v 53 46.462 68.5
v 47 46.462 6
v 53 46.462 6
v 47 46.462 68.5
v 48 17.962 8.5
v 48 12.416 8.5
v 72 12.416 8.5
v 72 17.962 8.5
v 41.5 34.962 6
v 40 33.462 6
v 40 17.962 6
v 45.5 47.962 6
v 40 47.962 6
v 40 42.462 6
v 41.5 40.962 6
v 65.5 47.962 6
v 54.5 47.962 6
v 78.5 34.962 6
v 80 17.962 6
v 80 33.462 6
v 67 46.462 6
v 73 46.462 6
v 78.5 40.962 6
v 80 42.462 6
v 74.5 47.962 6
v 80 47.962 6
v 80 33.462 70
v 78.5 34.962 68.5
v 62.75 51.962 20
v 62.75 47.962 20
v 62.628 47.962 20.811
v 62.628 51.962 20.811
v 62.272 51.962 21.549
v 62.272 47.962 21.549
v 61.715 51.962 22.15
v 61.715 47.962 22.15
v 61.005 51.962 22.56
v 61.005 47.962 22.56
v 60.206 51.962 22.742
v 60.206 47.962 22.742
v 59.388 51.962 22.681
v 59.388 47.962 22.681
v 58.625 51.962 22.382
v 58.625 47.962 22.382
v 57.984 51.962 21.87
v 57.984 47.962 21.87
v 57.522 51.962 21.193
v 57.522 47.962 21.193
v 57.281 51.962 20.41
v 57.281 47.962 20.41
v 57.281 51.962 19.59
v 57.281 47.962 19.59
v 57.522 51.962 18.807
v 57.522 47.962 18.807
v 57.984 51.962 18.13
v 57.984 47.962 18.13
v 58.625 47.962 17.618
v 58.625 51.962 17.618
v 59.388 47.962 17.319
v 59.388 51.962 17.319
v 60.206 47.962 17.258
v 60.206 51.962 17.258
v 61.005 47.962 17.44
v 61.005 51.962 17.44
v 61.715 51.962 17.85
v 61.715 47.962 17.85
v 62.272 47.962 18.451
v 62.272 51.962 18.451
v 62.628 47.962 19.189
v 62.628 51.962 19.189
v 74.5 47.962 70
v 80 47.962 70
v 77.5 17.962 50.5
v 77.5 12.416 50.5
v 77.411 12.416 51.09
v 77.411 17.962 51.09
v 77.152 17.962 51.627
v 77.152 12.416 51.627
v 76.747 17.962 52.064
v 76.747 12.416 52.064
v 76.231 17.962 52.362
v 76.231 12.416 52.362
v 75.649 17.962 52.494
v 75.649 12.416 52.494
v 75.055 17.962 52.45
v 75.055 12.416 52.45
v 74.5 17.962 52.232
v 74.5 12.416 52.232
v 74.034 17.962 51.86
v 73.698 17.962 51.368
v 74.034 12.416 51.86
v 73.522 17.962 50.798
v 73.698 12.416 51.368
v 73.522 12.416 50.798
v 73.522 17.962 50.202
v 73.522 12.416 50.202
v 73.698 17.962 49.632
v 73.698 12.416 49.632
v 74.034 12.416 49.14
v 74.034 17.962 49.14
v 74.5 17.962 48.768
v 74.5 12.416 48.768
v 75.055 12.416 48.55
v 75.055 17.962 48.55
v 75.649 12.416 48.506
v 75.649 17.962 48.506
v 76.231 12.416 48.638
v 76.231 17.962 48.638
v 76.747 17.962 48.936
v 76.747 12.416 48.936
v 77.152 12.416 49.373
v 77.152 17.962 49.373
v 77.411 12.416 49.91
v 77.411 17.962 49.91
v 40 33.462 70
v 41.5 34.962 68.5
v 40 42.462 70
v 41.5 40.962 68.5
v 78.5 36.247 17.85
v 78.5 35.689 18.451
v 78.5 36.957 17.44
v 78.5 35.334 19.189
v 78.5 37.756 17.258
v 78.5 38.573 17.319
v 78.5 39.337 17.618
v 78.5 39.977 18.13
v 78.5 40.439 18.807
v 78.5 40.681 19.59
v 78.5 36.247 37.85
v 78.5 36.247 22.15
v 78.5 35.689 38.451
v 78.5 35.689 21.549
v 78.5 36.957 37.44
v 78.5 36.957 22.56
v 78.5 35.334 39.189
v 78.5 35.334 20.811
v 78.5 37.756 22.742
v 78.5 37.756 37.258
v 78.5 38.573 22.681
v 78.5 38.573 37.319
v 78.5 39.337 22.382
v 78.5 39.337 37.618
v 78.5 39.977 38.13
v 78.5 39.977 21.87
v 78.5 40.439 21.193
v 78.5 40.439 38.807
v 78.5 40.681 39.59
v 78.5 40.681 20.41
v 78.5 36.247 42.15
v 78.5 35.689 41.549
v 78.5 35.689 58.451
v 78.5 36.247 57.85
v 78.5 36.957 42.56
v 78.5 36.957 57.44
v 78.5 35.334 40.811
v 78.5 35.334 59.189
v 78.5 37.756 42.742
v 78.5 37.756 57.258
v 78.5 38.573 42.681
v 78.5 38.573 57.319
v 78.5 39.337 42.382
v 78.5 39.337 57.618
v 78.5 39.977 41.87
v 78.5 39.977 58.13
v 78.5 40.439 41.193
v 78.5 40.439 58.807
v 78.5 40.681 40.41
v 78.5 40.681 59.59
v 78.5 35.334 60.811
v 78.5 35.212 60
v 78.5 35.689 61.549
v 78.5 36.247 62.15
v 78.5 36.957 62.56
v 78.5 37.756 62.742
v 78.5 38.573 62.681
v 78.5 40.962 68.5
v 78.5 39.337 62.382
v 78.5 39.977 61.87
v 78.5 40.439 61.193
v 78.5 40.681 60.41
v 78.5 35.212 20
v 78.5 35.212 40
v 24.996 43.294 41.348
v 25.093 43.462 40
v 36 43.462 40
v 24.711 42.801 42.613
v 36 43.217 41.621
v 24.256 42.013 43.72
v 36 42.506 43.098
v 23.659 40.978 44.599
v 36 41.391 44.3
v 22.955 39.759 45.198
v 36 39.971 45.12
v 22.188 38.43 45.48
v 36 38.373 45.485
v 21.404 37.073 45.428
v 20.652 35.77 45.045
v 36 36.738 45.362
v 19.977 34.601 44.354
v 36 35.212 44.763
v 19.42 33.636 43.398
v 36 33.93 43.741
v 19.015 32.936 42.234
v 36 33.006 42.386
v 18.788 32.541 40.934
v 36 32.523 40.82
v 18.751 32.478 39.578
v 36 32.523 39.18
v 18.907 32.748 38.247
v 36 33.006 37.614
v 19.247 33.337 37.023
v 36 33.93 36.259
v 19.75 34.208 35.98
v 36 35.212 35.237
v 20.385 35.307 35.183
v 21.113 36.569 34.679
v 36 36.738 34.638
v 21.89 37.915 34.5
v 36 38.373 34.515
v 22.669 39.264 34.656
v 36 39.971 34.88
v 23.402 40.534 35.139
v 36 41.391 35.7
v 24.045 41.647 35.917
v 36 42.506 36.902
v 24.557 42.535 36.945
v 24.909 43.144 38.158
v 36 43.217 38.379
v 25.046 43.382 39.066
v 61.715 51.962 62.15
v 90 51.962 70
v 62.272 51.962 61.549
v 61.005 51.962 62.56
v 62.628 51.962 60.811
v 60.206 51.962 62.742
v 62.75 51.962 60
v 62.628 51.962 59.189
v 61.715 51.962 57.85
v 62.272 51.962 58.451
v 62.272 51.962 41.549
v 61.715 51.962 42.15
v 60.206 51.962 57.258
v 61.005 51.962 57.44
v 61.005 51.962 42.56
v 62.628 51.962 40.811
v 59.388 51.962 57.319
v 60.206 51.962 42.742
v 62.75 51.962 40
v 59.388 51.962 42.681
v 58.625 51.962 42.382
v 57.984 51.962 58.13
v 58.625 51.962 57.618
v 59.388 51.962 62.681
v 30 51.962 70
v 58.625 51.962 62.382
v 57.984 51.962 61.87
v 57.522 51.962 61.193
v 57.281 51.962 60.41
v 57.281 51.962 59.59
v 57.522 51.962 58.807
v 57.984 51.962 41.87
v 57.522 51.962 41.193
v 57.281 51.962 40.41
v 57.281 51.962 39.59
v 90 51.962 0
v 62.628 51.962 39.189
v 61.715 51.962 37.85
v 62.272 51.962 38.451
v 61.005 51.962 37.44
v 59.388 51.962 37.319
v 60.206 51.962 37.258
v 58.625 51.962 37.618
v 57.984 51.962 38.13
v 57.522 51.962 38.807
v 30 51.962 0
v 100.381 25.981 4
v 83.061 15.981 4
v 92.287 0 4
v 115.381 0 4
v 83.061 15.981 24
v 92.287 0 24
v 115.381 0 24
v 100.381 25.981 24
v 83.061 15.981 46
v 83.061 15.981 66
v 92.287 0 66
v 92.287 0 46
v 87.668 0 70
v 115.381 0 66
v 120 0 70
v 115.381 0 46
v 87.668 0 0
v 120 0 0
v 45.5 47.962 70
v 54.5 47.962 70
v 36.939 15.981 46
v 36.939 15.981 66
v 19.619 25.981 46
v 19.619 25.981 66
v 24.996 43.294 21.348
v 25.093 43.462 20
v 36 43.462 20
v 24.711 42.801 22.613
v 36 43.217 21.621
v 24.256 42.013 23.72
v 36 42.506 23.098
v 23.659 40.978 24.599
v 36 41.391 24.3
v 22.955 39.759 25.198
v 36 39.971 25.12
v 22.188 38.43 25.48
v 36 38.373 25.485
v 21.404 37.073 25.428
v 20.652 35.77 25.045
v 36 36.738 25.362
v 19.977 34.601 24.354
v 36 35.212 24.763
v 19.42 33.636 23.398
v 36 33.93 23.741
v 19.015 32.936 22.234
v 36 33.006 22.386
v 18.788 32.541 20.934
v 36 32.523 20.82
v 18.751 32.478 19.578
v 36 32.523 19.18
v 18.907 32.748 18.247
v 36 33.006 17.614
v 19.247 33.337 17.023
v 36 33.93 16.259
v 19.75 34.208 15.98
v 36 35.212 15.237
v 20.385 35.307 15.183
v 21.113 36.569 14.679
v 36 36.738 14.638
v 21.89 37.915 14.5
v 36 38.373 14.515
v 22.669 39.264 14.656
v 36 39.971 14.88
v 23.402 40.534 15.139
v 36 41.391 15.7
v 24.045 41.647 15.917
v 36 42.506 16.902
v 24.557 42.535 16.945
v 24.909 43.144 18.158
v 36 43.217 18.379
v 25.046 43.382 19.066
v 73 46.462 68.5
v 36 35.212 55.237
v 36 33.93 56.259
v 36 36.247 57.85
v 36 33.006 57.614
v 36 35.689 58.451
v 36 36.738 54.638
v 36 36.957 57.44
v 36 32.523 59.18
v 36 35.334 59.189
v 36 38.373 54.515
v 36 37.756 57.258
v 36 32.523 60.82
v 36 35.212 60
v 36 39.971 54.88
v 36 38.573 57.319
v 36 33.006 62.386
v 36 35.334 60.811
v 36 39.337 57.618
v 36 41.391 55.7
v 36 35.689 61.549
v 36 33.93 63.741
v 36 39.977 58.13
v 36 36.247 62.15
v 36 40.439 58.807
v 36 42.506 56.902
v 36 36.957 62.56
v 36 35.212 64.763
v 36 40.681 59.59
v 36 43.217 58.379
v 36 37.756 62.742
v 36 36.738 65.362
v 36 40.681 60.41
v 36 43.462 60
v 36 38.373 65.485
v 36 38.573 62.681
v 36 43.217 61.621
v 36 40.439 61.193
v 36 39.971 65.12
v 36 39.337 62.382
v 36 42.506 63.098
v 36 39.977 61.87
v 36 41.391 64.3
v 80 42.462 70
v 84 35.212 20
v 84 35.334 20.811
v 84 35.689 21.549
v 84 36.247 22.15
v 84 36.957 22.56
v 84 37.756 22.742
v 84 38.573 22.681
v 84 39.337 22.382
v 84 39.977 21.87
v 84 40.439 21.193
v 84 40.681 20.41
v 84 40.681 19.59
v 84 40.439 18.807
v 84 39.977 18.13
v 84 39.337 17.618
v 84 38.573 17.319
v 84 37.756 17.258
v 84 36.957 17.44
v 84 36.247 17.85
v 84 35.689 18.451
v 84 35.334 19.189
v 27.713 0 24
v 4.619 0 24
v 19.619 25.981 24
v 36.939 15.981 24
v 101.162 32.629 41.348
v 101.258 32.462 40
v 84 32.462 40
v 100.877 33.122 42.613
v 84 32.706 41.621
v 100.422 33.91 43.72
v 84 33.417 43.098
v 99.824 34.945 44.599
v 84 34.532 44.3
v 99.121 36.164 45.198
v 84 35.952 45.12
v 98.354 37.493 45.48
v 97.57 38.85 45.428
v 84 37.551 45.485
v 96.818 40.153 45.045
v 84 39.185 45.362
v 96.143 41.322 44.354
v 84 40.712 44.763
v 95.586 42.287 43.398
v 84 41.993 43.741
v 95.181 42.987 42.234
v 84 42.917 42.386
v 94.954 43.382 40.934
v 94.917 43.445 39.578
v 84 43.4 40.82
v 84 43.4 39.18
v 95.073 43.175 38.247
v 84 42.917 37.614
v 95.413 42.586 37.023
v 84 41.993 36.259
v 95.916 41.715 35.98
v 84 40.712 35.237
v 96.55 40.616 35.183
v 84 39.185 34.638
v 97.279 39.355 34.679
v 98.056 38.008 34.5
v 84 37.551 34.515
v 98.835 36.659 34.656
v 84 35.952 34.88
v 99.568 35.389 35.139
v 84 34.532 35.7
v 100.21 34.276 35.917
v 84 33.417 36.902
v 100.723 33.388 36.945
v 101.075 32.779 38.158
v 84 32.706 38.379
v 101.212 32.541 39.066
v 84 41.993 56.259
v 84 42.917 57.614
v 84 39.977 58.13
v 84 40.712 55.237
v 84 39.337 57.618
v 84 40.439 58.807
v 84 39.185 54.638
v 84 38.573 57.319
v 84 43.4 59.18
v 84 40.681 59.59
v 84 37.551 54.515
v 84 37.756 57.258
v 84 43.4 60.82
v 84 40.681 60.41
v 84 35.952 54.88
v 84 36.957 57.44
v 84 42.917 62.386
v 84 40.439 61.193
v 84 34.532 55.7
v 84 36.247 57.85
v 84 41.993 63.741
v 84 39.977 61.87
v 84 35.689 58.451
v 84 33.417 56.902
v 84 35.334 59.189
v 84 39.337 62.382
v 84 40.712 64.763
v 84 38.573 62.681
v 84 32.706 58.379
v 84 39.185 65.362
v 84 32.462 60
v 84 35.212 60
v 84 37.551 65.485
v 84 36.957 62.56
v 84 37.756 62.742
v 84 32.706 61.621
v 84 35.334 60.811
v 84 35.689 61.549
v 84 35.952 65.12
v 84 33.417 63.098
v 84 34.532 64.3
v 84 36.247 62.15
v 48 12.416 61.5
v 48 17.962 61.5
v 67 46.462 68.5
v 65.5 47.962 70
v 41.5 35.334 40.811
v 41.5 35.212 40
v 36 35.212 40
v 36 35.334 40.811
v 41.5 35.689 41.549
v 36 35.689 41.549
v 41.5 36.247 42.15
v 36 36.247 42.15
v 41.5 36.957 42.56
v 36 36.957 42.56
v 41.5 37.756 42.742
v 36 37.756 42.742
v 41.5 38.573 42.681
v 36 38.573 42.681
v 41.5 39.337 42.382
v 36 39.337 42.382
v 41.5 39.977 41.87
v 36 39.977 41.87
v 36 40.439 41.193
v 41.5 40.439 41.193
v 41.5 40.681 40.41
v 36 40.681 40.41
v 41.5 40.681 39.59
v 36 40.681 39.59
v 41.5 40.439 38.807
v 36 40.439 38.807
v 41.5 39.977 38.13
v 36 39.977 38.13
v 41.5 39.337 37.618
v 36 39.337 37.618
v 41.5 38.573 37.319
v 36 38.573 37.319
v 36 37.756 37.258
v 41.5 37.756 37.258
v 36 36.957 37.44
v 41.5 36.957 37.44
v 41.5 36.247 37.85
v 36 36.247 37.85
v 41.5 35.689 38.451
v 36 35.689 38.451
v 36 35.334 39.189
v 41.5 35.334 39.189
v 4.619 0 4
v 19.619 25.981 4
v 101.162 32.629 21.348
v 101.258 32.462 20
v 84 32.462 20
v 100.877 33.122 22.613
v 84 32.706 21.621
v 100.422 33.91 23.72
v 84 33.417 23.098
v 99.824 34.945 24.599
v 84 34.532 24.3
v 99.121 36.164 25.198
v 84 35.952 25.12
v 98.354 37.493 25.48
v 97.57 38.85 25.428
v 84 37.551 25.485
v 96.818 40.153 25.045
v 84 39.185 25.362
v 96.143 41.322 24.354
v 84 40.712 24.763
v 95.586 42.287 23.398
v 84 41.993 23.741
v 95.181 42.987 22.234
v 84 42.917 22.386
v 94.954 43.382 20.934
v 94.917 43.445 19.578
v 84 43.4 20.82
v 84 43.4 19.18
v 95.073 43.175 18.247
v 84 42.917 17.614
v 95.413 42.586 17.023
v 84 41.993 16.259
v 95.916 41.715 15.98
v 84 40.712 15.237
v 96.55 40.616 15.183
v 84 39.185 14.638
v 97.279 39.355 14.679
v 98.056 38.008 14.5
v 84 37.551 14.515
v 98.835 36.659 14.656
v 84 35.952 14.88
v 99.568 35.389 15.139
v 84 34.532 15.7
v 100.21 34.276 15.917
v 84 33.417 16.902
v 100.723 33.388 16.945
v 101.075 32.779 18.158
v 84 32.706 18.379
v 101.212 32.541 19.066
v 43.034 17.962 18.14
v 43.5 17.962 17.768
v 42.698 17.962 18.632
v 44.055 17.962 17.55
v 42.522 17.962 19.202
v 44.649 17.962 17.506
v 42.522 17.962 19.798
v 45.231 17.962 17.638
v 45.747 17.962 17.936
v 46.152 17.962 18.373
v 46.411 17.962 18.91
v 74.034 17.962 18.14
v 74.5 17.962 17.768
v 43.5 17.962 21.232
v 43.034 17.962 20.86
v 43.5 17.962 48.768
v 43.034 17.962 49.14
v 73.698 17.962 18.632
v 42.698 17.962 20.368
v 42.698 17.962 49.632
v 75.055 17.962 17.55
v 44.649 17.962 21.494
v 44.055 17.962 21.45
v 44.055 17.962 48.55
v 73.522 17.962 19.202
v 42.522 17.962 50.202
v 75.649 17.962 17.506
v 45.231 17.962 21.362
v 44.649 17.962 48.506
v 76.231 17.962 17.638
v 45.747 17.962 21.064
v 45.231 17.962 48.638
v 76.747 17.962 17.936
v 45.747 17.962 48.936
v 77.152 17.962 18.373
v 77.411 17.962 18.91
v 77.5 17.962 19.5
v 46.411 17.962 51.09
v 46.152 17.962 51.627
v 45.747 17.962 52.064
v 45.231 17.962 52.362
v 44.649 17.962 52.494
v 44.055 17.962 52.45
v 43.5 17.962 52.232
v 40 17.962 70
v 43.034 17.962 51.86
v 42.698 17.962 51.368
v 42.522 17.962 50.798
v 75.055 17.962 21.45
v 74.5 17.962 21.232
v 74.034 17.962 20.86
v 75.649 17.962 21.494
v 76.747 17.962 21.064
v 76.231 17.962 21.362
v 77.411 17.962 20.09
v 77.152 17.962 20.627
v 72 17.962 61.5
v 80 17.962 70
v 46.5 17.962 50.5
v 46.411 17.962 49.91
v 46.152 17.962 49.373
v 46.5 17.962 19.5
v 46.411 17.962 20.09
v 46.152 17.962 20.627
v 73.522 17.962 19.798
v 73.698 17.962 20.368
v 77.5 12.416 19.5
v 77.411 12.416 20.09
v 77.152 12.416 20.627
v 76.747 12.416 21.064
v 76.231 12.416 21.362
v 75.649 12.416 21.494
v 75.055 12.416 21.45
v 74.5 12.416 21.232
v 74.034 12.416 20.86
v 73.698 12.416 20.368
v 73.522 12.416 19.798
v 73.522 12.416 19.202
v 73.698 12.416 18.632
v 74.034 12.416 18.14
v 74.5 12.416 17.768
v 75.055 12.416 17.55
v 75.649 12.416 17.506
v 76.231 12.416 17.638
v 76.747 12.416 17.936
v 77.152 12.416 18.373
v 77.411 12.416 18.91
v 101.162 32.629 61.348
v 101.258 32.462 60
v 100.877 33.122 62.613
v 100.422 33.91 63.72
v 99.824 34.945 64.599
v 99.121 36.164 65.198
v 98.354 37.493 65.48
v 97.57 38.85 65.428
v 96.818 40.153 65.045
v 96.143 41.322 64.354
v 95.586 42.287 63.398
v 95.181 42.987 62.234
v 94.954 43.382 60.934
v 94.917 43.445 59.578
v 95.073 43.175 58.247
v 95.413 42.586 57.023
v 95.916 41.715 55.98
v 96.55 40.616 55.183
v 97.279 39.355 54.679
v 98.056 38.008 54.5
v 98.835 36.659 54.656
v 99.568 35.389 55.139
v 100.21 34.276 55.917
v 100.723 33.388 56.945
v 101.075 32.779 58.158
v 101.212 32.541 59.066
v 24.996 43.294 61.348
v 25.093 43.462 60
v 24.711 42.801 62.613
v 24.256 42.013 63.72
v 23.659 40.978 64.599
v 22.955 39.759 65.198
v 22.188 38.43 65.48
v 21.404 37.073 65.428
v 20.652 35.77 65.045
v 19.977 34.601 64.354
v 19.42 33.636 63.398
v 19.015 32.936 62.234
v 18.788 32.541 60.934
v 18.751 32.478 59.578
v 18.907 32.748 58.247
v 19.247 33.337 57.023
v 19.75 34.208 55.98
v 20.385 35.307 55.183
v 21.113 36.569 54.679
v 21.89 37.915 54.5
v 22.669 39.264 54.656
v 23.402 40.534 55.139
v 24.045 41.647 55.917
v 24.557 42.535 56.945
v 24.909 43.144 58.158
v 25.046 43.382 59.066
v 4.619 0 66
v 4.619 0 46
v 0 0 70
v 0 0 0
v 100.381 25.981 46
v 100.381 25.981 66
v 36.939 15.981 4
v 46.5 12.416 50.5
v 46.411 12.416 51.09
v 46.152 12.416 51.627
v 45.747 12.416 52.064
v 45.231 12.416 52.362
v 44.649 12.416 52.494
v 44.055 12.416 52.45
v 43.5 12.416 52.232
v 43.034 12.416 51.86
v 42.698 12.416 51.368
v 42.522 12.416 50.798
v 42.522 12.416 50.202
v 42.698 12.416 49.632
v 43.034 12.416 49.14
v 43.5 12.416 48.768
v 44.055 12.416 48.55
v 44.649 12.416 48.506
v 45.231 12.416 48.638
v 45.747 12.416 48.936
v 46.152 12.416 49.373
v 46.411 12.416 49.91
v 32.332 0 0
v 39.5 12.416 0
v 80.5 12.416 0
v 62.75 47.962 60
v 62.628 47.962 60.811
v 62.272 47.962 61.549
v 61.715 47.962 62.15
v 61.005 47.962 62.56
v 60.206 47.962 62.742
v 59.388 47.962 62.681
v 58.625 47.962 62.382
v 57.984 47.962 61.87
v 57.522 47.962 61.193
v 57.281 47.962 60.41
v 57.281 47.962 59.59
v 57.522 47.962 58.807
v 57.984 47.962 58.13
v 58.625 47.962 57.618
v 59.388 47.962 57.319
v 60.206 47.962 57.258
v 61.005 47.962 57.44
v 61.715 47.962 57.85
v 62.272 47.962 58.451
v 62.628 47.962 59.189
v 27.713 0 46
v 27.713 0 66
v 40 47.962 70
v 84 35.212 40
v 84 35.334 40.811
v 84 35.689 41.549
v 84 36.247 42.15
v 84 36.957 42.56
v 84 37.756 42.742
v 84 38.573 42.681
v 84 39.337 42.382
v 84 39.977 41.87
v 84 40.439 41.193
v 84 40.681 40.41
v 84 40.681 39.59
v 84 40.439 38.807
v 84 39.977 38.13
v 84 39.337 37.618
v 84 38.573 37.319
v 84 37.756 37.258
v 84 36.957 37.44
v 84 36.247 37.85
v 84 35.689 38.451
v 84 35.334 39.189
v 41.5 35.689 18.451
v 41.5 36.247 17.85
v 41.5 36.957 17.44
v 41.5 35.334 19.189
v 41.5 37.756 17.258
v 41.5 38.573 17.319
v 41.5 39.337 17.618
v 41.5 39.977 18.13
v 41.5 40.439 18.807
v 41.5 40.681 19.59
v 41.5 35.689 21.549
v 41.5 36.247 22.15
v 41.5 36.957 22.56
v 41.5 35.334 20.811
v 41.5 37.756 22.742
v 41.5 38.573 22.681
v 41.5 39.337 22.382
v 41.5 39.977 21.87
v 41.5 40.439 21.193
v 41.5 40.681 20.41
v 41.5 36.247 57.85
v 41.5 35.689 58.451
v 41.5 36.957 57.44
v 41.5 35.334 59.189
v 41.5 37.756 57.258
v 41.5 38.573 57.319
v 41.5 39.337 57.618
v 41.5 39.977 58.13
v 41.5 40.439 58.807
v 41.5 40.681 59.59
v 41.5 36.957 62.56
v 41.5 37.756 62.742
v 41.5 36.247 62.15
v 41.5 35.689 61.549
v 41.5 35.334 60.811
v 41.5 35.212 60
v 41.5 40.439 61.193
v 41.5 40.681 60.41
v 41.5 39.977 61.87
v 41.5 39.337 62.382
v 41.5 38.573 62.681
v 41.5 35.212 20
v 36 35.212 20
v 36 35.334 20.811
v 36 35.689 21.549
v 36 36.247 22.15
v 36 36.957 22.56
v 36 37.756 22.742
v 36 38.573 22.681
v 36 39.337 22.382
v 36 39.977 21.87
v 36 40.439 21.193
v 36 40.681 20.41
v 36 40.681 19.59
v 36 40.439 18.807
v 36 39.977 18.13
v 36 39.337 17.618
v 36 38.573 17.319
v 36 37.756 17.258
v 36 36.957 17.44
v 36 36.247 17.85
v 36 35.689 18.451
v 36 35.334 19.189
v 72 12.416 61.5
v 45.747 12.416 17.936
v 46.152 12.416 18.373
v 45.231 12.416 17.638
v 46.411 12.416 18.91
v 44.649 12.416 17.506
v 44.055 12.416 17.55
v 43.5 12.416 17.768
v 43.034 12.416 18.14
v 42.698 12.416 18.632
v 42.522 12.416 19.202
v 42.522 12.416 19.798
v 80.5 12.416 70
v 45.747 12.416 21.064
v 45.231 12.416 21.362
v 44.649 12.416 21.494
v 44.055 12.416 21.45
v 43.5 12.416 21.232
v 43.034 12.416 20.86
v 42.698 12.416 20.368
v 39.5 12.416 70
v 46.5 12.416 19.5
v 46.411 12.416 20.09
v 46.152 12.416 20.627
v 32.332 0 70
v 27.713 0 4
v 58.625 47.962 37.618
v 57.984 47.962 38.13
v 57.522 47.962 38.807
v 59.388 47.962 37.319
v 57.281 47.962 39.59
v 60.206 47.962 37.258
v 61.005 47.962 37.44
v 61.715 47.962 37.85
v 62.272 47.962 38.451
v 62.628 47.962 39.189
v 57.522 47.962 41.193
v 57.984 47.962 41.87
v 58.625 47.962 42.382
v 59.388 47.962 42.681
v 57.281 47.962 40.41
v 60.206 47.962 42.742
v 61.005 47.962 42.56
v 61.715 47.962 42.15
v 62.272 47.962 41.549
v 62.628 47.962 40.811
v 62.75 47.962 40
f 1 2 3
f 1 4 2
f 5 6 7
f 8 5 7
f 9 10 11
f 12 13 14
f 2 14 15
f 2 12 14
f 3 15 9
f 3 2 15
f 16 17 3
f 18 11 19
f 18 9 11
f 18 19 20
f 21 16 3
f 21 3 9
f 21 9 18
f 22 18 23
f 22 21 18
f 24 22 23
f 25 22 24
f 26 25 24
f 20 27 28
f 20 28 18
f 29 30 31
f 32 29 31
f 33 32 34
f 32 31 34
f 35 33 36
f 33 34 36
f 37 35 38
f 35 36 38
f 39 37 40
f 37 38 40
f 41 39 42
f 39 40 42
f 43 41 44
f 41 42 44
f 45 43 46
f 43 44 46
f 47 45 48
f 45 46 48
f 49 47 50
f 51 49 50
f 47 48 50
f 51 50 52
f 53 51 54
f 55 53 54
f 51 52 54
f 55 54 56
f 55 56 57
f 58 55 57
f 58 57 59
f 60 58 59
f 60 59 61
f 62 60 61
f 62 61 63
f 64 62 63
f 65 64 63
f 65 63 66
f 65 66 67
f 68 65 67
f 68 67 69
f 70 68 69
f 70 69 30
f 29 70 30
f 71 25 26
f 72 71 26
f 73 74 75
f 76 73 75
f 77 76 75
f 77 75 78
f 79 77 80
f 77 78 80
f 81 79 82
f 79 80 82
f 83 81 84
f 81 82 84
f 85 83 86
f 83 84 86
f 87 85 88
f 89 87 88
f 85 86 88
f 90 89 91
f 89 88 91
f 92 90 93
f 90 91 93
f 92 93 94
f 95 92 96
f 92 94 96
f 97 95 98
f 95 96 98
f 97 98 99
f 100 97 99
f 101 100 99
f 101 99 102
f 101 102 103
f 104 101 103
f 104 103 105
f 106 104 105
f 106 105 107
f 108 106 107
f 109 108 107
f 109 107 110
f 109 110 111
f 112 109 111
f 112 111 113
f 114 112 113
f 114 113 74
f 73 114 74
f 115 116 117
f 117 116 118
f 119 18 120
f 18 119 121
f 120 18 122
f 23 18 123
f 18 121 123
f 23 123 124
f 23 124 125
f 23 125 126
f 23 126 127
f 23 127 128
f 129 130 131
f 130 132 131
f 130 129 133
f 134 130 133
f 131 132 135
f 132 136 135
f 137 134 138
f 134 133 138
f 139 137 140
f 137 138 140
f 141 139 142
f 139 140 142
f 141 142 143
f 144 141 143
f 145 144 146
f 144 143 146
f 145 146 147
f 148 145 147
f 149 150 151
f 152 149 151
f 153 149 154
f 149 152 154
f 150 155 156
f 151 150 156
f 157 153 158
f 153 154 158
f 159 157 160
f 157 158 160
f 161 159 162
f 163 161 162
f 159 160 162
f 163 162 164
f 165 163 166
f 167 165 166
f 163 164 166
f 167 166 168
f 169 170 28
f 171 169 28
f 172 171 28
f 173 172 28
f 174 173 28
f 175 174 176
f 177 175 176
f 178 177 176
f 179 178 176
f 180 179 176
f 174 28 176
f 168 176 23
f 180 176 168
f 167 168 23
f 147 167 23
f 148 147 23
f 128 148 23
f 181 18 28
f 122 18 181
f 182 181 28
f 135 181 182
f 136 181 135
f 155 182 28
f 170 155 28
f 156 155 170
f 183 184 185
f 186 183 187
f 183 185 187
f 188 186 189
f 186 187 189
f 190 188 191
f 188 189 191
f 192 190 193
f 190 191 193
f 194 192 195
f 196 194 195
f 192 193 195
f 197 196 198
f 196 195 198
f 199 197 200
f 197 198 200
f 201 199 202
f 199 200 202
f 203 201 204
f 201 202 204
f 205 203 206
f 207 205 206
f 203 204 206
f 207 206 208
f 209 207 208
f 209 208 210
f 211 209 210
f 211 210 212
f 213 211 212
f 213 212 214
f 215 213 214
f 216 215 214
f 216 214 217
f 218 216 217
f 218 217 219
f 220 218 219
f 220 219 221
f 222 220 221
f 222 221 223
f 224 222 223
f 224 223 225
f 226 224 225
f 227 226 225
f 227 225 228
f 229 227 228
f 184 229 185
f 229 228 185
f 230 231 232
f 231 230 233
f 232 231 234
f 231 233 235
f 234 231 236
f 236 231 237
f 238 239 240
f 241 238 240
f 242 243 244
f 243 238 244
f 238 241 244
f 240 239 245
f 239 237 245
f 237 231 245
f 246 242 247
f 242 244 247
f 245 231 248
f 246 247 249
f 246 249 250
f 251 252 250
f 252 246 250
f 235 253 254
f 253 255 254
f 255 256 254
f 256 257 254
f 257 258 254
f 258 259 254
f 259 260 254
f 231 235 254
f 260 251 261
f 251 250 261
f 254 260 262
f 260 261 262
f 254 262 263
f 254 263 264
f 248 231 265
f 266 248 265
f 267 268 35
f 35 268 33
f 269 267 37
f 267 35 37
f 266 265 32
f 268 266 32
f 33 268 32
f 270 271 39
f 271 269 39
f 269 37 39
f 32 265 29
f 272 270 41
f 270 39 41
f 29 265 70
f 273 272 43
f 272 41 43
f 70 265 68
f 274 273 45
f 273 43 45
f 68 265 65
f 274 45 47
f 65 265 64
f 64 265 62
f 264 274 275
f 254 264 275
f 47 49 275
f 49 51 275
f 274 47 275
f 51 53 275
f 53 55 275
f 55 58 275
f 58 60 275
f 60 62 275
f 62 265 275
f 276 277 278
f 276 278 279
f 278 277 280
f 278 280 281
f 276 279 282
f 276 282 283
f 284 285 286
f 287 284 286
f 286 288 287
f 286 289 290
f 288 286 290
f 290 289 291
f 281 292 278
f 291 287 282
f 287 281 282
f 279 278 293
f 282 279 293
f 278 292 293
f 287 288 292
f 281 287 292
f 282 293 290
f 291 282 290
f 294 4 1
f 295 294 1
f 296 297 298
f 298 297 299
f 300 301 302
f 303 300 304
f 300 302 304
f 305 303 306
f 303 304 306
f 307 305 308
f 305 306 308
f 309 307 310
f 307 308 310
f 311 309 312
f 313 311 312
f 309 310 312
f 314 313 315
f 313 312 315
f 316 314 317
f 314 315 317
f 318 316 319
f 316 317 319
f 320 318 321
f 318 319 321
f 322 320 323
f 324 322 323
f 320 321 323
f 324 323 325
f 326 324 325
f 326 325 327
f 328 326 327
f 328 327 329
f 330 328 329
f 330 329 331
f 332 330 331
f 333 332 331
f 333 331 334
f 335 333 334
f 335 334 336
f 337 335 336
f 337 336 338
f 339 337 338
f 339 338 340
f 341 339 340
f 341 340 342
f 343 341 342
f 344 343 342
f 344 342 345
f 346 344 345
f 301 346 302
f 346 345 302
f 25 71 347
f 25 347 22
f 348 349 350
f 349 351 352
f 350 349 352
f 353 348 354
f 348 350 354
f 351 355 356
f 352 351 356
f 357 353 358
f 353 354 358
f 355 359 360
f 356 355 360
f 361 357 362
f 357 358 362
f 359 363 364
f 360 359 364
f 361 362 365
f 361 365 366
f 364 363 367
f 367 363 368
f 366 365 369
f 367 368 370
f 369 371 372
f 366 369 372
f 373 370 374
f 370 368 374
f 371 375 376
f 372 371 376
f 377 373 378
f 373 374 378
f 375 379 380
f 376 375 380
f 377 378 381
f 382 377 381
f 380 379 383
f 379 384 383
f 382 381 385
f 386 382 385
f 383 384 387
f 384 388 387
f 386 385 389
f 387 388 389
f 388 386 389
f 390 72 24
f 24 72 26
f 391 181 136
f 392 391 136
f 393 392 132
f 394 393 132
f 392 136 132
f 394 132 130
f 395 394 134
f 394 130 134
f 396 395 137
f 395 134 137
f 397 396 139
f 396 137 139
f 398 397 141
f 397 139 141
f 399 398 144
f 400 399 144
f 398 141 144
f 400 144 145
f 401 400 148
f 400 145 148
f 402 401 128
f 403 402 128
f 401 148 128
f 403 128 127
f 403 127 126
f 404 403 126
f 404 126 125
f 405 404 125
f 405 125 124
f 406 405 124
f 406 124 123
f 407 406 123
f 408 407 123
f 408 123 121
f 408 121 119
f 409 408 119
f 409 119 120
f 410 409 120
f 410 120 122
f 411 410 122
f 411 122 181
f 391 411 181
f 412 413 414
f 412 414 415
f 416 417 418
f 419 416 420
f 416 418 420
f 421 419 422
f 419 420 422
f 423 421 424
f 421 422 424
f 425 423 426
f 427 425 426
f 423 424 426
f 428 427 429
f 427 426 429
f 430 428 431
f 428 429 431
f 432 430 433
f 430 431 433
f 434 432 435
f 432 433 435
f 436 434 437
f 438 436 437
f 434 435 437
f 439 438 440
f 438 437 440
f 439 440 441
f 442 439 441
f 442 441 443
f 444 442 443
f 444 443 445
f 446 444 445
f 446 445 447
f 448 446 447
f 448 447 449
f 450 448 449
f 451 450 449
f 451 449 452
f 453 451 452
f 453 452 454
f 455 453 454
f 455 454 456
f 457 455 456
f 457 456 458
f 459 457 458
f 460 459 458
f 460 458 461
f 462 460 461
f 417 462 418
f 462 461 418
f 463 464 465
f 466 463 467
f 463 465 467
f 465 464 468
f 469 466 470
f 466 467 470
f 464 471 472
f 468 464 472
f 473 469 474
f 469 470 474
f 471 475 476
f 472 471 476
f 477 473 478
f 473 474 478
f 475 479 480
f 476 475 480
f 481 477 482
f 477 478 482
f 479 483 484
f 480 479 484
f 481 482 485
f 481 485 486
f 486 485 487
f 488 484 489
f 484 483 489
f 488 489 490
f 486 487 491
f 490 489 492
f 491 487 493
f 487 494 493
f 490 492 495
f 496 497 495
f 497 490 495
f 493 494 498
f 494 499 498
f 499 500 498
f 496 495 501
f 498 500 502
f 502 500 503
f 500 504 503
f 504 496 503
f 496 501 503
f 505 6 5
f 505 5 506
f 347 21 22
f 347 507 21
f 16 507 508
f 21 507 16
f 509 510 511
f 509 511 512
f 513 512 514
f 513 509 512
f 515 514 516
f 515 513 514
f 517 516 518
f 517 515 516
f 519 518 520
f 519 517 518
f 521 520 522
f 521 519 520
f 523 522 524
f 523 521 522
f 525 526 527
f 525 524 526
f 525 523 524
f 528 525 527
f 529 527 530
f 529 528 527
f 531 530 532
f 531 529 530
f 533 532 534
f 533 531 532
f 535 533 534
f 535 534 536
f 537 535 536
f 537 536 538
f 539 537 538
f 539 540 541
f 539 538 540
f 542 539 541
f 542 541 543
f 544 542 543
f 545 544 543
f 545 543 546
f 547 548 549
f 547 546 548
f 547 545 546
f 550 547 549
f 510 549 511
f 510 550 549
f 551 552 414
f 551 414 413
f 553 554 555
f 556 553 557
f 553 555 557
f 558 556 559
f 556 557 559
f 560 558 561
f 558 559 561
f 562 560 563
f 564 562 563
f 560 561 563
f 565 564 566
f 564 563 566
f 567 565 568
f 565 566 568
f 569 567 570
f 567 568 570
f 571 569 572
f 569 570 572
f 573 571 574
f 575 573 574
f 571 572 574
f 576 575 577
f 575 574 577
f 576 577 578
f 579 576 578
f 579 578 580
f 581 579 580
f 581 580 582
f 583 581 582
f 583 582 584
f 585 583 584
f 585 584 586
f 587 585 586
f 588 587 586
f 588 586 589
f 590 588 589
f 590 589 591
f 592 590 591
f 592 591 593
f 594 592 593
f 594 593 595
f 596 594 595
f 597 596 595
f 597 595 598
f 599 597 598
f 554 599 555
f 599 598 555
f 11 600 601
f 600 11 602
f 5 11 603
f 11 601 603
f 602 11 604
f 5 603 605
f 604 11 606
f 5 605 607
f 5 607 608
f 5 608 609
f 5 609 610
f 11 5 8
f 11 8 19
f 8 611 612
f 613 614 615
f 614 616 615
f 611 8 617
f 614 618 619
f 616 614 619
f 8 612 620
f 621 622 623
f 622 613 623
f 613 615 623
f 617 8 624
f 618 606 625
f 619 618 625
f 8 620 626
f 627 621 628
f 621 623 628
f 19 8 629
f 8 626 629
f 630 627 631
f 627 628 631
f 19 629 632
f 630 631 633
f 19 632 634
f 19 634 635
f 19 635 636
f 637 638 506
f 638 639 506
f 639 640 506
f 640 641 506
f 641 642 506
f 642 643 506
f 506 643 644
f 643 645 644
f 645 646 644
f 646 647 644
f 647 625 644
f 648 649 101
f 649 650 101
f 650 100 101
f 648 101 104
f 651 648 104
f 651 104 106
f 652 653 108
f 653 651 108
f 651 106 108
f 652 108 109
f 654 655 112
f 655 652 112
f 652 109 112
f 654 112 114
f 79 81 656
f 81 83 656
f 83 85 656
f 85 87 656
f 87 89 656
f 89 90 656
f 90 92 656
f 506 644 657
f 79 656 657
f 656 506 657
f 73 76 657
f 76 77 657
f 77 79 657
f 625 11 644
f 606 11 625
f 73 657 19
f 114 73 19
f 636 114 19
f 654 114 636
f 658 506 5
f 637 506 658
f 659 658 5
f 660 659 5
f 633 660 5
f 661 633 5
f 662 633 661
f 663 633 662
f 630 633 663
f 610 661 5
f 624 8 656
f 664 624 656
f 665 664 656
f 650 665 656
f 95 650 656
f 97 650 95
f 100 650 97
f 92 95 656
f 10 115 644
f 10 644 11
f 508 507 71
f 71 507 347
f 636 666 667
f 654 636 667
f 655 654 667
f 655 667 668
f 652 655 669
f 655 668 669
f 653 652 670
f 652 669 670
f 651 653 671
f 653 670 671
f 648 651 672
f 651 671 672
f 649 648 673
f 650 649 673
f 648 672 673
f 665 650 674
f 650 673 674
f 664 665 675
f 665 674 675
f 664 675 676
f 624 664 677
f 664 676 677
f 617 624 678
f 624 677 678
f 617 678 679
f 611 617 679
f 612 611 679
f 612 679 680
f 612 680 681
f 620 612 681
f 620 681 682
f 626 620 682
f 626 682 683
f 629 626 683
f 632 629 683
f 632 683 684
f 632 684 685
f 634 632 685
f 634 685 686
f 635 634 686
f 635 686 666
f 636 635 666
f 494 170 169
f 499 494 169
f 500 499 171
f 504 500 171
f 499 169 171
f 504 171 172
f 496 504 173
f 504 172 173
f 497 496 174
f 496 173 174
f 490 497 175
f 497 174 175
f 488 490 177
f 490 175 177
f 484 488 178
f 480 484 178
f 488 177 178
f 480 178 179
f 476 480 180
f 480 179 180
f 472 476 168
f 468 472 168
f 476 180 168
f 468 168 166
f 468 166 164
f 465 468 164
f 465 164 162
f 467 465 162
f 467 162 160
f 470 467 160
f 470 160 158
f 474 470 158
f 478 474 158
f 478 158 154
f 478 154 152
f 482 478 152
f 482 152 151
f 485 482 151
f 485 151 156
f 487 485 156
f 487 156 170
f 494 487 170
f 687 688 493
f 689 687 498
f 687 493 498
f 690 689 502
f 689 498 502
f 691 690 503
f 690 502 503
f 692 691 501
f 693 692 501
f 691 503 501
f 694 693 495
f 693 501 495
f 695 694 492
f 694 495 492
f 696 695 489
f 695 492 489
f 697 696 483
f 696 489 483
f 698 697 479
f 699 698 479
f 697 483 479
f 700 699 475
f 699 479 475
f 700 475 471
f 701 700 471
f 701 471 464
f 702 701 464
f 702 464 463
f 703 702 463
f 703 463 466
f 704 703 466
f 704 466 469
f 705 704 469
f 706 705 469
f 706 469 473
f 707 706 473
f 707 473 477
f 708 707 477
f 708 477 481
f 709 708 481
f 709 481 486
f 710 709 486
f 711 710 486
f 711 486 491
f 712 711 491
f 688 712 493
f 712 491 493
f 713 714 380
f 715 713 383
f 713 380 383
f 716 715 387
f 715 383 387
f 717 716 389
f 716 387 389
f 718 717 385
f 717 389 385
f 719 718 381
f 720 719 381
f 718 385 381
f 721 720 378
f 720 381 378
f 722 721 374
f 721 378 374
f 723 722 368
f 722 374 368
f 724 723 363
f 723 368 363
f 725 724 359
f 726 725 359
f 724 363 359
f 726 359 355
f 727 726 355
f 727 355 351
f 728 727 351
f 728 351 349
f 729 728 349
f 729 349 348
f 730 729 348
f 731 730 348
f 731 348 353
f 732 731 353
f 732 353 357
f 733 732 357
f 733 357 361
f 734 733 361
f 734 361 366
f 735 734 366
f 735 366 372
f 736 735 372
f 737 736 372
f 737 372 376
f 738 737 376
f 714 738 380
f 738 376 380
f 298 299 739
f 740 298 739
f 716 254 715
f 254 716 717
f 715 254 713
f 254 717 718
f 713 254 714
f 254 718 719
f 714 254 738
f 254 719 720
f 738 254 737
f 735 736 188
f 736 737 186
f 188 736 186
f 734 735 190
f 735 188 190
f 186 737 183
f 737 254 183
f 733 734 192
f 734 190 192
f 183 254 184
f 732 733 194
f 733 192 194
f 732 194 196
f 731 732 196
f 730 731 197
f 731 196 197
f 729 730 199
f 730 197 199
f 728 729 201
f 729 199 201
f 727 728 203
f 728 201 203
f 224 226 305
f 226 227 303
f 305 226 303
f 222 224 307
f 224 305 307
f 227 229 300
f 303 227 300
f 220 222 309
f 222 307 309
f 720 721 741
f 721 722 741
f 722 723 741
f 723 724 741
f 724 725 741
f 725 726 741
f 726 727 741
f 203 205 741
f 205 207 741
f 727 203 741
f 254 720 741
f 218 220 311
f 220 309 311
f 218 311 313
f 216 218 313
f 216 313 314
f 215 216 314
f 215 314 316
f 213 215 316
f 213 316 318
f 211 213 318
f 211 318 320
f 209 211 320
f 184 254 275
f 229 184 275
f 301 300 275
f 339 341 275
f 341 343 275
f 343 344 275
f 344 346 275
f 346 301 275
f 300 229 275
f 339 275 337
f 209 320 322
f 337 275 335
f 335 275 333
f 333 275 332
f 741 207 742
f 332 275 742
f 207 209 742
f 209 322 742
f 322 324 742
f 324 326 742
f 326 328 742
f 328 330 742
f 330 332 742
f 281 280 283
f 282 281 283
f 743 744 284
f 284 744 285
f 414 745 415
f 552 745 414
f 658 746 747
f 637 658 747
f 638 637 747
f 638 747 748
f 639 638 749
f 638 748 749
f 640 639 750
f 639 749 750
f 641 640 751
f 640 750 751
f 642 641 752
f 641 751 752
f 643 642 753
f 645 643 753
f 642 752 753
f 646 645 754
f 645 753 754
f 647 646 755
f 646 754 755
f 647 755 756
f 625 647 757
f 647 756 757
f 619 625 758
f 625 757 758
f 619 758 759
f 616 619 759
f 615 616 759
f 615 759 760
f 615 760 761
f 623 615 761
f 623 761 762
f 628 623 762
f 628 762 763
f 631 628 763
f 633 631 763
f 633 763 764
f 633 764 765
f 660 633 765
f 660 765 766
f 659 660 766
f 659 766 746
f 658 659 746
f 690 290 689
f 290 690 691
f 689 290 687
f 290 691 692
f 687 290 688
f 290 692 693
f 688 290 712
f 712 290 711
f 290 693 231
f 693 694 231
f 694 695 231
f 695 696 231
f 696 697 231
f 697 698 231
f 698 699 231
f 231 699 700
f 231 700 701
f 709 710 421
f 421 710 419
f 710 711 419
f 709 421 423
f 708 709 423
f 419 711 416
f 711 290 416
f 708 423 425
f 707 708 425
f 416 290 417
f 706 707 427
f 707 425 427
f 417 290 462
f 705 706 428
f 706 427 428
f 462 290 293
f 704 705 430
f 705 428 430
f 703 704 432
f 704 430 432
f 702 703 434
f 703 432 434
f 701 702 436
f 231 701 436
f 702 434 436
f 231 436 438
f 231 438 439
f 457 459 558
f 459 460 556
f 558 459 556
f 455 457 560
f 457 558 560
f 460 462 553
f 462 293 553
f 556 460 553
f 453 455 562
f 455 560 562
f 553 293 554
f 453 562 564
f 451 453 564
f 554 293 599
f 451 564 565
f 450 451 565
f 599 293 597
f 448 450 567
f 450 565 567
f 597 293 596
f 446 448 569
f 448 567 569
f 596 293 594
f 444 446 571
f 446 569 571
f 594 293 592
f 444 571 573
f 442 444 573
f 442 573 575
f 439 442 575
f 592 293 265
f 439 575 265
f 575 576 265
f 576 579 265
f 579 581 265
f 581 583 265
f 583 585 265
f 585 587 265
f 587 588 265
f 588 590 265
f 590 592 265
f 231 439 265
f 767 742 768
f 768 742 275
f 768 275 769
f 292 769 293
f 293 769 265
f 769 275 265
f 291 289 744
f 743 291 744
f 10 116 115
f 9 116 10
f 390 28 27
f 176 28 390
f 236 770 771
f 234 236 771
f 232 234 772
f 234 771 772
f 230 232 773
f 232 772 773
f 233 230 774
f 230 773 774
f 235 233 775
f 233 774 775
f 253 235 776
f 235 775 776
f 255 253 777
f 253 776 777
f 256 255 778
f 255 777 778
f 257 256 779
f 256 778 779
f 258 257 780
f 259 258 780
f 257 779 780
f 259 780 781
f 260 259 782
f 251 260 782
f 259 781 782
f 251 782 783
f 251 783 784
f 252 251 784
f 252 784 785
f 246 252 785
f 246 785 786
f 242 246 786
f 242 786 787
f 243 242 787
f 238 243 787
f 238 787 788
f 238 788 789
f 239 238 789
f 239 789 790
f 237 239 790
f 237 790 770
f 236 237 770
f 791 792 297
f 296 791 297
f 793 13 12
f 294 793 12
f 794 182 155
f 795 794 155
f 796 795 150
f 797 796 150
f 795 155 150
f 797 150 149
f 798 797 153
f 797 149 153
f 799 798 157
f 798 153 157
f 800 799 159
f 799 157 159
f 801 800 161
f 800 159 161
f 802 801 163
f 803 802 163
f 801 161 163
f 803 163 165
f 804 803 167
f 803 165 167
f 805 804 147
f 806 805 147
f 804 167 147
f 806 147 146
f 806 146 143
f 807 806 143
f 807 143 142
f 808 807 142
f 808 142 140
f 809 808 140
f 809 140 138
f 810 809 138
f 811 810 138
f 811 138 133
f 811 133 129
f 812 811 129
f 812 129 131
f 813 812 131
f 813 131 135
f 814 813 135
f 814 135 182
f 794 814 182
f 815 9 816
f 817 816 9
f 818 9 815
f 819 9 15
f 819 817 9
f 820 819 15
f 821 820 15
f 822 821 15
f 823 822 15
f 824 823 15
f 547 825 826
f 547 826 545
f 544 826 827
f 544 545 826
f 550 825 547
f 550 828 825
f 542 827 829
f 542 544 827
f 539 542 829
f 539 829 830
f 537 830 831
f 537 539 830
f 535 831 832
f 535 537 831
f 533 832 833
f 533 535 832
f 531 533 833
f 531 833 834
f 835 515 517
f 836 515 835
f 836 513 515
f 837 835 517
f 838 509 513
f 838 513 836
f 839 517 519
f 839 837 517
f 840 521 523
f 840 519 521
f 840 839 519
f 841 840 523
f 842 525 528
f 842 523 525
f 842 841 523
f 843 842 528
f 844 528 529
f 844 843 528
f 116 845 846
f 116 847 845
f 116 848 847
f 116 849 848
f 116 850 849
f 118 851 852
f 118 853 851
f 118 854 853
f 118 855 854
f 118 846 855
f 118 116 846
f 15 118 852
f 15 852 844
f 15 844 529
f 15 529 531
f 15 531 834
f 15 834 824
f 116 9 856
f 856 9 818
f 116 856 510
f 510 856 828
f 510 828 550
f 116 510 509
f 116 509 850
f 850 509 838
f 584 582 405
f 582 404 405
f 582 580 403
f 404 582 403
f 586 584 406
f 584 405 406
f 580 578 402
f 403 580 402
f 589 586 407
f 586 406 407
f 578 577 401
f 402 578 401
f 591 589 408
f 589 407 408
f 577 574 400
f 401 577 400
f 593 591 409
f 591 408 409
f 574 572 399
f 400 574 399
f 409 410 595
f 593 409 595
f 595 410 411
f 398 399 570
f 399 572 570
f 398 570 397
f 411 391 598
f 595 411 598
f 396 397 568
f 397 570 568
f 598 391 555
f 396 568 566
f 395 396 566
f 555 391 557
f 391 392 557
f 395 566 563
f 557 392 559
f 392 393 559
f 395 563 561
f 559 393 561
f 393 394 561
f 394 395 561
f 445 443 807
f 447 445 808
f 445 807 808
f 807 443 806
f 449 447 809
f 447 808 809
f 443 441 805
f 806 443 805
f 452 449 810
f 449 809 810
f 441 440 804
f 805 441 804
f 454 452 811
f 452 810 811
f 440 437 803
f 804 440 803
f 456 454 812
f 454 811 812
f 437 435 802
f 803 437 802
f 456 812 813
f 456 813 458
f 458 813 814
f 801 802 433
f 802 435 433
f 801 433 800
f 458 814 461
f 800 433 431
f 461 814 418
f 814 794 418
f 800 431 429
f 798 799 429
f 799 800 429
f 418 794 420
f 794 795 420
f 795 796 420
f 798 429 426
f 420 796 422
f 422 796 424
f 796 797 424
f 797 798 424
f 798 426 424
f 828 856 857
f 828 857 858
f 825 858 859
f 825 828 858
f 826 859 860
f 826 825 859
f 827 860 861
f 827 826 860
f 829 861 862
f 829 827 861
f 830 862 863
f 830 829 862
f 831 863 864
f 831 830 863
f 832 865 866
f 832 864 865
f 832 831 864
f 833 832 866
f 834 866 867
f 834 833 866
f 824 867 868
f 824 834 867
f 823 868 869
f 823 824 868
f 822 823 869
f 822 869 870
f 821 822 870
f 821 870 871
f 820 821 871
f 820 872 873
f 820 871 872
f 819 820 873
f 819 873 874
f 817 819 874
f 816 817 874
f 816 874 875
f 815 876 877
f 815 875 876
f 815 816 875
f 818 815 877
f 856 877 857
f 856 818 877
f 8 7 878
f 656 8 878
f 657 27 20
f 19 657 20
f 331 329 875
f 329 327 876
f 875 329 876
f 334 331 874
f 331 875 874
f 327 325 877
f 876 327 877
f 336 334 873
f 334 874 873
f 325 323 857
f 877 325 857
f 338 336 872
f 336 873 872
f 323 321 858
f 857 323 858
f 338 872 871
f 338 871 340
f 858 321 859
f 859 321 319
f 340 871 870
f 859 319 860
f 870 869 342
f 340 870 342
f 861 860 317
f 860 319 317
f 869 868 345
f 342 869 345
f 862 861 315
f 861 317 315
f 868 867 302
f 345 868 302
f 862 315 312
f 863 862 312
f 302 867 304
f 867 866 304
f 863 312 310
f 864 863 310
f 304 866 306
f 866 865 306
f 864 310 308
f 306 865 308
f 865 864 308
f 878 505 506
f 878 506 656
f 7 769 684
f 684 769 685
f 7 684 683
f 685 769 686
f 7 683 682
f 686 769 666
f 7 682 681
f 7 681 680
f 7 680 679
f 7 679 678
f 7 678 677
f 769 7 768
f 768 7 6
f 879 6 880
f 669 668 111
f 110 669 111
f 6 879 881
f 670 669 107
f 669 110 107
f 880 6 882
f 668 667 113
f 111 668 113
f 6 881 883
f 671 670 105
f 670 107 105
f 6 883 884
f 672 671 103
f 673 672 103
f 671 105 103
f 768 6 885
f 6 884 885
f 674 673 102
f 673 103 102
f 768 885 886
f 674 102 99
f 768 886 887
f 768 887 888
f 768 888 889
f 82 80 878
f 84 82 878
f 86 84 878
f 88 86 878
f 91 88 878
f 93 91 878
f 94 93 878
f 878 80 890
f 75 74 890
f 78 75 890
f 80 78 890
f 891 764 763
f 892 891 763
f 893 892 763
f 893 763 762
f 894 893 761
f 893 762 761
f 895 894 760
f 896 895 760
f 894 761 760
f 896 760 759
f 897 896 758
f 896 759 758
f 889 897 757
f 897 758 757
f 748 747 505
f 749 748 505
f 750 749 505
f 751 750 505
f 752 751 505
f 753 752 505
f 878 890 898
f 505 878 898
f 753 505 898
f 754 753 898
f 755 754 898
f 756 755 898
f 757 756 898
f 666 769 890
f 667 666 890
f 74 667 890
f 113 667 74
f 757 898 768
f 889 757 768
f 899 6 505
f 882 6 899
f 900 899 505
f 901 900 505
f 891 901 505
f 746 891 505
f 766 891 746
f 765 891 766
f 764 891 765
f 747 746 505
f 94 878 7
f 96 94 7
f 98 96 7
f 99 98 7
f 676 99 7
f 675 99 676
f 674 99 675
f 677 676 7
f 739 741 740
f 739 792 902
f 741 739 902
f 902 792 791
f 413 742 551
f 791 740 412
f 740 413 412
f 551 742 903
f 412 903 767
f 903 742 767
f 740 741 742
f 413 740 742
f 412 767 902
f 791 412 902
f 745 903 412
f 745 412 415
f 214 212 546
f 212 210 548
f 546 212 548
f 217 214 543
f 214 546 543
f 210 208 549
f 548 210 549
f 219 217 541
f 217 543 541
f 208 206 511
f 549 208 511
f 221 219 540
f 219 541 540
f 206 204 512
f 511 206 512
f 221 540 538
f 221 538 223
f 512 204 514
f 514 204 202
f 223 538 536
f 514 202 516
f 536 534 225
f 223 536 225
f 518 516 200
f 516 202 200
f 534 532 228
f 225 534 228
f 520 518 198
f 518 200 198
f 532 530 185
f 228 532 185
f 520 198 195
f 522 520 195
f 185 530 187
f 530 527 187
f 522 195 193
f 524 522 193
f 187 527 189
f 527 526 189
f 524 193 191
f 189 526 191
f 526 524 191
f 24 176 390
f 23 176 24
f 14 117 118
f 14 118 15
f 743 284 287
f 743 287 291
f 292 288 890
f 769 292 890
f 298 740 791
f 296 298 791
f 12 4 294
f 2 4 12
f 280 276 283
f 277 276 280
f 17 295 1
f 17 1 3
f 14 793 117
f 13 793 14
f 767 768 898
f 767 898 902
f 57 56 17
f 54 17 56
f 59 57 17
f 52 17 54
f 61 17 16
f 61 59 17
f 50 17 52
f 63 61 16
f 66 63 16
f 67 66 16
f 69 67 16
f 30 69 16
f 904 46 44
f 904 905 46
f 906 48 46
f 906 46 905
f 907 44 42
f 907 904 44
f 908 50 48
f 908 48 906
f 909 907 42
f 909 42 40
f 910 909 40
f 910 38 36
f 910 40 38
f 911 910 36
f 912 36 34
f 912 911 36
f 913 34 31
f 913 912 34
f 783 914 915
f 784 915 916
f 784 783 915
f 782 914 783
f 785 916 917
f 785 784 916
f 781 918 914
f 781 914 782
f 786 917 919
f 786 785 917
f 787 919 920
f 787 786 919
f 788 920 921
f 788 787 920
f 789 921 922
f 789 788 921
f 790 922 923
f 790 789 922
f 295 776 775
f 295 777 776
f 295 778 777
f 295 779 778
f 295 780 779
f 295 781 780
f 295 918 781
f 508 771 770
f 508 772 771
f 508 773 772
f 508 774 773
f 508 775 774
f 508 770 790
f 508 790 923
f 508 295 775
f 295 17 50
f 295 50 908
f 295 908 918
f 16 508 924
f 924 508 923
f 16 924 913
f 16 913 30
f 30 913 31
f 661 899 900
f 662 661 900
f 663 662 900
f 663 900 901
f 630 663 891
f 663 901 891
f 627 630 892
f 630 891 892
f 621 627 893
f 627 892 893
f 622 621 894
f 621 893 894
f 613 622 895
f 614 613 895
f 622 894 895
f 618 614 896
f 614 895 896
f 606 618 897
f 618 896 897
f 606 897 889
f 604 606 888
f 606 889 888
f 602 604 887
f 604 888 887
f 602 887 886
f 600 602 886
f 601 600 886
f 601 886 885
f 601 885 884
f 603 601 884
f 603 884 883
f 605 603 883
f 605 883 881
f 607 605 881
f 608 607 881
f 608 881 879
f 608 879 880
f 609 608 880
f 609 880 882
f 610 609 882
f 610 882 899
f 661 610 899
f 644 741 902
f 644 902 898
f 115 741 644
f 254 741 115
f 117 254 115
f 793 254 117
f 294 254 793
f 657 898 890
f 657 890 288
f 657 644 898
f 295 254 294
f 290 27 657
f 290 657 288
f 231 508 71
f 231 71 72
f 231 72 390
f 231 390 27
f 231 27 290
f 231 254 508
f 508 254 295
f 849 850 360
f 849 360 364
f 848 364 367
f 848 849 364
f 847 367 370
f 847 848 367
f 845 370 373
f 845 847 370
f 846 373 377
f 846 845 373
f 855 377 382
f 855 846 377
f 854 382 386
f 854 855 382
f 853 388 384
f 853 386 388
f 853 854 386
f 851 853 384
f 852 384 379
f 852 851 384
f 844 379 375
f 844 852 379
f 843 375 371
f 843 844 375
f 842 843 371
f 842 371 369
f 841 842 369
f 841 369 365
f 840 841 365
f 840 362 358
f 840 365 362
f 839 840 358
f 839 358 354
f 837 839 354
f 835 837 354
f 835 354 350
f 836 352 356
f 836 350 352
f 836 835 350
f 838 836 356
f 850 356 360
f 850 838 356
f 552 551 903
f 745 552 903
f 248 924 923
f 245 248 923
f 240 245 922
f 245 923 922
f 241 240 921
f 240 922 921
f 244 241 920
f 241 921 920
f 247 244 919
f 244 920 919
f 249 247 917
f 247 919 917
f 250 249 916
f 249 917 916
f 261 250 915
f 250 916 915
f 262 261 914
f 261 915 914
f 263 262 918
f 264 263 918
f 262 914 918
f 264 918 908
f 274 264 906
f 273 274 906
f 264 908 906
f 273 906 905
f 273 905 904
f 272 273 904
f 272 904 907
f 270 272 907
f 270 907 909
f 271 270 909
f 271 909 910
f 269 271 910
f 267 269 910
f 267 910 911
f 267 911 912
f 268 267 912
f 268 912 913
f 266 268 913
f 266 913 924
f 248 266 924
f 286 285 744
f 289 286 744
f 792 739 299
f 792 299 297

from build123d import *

# Parameters (mm, degrees)
F1_DEPTH       = 70
F2_W           = 40
F2_H           = 20
F3_DEPTH       = 64
F6_DEPTH       = 20
F9_DEPTH       = 20
F11_DEPTH      = 70.001
F12_W          = 24
F12_H          = 53
F13_DEPTH      = 15.5455173281
F14_R          = 2
F15_DEPTH      = 15.5455173281
F16_DEPTH      = 10
F17_W          = 1.5
F17_H          = 9
F17_W_2        = 9
F17_H_2        = 1.5
F18_DEPTH      = 64
F19_SIZE       = 1.49999
F20_R          = 2.75
F21_DEPTH      = 41.501
F21_DEPTH_BACK = 78.501
F24_R          = 5.5
F25_DEPTH      = 36.001
F26_R          = 5.5
F27_DEPTH      = 36.001
F28_R          = 2.75
F29_DEPTH      = 4.001


# Not quite as in the source:
# - a fillet or chamfer is up to 0.001 mm smaller than in the source, because OpenCascade refuses the exact size


with BuildPart() as f1:
    # F0 (on Top) → F1 (new body)
    with BuildSketch(Plane.XY):
        Polygon((30, 51.9615242271), (0, 0), (120, 0), (90, 51.9615242271), align=None)
    extrude(amount=F1_DEPTH)

    # F2 (on face) → F3 (cut)
    with BuildSketch(Plane.XY.offset(70)):
        with Locations((60, 37.9615242271)):
            Rectangle(F2_W, F2_H)
    extrude(amount=-F3_DEPTH, mode=Mode.SUBTRACT)

    # F5 (on offset) → F6 (cut)
    with BuildSketch(Plane.XY.offset(4)):
        Polygon((19.6188021535, 25.9807621135), (4.6188021535, 0), (27.7128129211, 0), (36.9393102292, 15.9807621135), align=None)
        Polygon((100.3811978465, 25.9807621135), (83.0606897708, 15.9807621135), (92.2871870789, 0), (115.3811978465, 0), align=None)
    extrude(amount=F6_DEPTH, mode=Mode.SUBTRACT)

    # F8 (on offset) → F9 (cut)
    with BuildSketch(Plane.XY.offset(66)):
        Polygon((19.6188021535, 25.9807621135), (4.6188021535, 0), (27.7128129211, 0), (36.9393102292, 15.9807621135), align=None)
        Polygon((100.3811978465, 25.9807621135), (83.0606897708, 15.9807621135), (92.2871870789, 0), (115.3811978465, 0), align=None)
    extrude(amount=-F9_DEPTH, mode=Mode.SUBTRACT)

    # F10 (on face) → F11 (cut, through all)
    with BuildSketch(Plane.XY.offset(70)):
        Polygon((39.5, 12.416006899), (32.3316150746, 0), (87.6683849254, 0), (80.5, 12.416006899), align=None)
    extrude(amount=-F11_DEPTH, mode=Mode.SUBTRACT)

    # F12 (on face) → F13 (cut, through all)
    with BuildSketch(Plane.XZ.offset(-12.416006899)):
        with Locations((60, 35)):
            Rectangle(F12_W, F12_H)
    extrude(amount=-F13_DEPTH, mode=Mode.SUBTRACT)

    # F14 (on face) → F15 (cut, through all)
    with BuildSketch(Plane.XZ.offset(-12.416006899)):
        with Locations((44.5, 50.5)):
            Circle(F14_R)
        with Locations((44.5, 19.5)):
            Circle(F14_R)
        with Locations((75.5, 19.5)):
            Circle(F14_R)
        with Locations((75.5, 50.5)):
            Circle(F14_R)
    extrude(amount=-F15_DEPTH, mode=Mode.SUBTRACT)

    # F16 (cut): a face of the model
    f16_faces = [f1.faces().sort_by_distance(p)[0] for p in [
        (40.7547184906, 27.9615242271, 38),
    ]]
    extrude(f16_faces, amount=-F16_DEPTH, mode=Mode.SUBTRACT)

    # F17 (on face) → F18 (join, through all)
    with BuildSketch(Plane.XY.offset(70)):
        with Locations((40.75, 37.9615242271)):
            Rectangle(F17_W, F17_H)
        with Locations((50, 47.2115242271)):
            Rectangle(F17_W_2, F17_H_2)
        with Locations((79.25, 37.9615242271)):
            Rectangle(F17_W, F17_H)
        with Locations((70, 47.2115242271)):
            Rectangle(F17_W_2, F17_H_2)
    extrude(amount=-F18_DEPTH)

    # F19 (size 1.5 in the source; OpenCascade refuses exactly that, so slightly less here)
    f19_edges = [f1.edges().sort_by_distance(p)[0] for p in [
        (54.5, 46.461524, 38),
        (45.5, 46.461524, 38),
        (50, 46.461524, 70),
        (41.5, 37.961524, 70),
        (41.5, 33.461524, 38),
        (65.5, 46.461524, 38),
        (74.5, 46.461524, 38),
        (78.5, 33.461524, 38),
        (78.5, 42.461524, 38),
        (70, 46.461524, 70),
        (78.5, 37.961524, 70),
        (41.5, 42.461524, 38),
    ]]
    chamfer(f19_edges, length=F19_SIZE)

    # F20 (on face) → F21 (cut, two sides)
    with BuildSketch(Plane(origin=(78.5, 0, 0), x_dir=(0, -1, 0), z_dir=(-1, 0, 0))) as f21_sk:
        with Locations((-37.9615242271, 60)):
            Circle(F20_R)
        with Locations((-37.9615242271, 40)):
            Circle(F20_R)
        with Locations((-37.9615242271, 20)):
            Circle(F20_R)
    extrude(amount=-F21_DEPTH, mode=Mode.SUBTRACT)
    extrude(f21_sk.sketch, amount=F21_DEPTH_BACK, mode=Mode.SUBTRACT)

    # F24 (on offset) → F25 (cut, through all)
    with BuildSketch(Plane(origin=(84, 0, 0), x_dir=(0, -1, 0), z_dir=(-1, 0, 0))):
        with Locations((-37.9615242271, 60)):
            Circle(F24_R)
        with Locations((-37.9615242271, 40)):
            Circle(F24_R)
        with Locations((-37.9615242271, 20)):
            Circle(F24_R)
    extrude(amount=-F25_DEPTH, mode=Mode.SUBTRACT)

    # F26 (on offset) → F27 (cut, through all)
    with BuildSketch(Plane.YZ.offset(36)):
        with Locations((37.9615242271, 60)):
            Circle(F26_R)
        with Locations((37.9615242271, 40)):
            Circle(F26_R)
        with Locations((37.9615242271, 20)):
            Circle(F26_R)
    extrude(amount=-F27_DEPTH, mode=Mode.SUBTRACT)

    # F28 (on face) → F29 (cut, through all)
    with BuildSketch(Plane.XZ.offset(-47.9615242271)):
        with Locations((60, 60)):
            Circle(F28_R)
        with Locations((60, 40)):
            Circle(F28_R)
        with Locations((60, 20)):
            Circle(F28_R)
    extrude(amount=-F29_DEPTH, mode=Mode.SUBTRACT)


solid = f1.part
